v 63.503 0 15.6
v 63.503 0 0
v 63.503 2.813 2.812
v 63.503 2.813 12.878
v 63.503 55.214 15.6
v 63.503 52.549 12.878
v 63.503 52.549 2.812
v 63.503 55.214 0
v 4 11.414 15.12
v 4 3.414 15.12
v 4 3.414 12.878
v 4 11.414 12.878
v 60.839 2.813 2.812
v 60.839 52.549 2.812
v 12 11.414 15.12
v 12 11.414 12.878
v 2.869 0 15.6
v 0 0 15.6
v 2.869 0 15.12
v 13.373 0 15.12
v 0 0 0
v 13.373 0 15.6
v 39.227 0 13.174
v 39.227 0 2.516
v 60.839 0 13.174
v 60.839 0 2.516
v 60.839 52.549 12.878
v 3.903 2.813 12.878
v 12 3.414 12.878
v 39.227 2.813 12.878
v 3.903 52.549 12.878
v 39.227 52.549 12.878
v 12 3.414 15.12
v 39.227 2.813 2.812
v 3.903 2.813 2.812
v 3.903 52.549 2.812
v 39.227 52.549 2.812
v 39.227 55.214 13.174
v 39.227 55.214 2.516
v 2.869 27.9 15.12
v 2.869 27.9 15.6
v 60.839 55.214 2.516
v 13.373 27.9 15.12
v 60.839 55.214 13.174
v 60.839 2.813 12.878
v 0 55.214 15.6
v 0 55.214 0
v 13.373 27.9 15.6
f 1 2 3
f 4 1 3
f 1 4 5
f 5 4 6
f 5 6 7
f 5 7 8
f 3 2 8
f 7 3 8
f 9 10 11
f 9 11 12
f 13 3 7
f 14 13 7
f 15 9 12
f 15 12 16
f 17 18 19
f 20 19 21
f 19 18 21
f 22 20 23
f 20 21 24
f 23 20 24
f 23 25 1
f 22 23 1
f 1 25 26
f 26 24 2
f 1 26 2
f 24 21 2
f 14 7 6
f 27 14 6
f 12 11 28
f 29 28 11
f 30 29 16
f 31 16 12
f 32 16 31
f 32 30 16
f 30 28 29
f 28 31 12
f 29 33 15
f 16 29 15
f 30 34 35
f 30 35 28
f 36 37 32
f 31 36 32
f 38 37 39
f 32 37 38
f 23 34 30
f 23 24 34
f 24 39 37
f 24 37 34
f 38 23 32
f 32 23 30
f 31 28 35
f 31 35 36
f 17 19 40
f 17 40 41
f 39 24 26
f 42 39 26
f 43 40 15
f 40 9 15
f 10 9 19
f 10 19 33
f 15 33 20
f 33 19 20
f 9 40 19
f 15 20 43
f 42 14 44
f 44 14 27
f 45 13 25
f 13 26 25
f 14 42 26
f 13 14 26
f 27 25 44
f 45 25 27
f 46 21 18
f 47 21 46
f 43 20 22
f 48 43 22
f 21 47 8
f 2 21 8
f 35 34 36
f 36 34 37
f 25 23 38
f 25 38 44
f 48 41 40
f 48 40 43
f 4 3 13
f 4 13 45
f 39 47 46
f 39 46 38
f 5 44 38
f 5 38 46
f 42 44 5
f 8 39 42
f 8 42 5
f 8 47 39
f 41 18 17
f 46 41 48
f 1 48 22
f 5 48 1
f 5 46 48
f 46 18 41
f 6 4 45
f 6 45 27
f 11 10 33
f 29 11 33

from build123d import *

# Parameters (mm, degrees)
F0_W     = 63.503295
F0_H     = 55.21382
F1_DEPTH = 15.6
F2_W     = 21.611847
F2_H     = 10.657895
F3_DEPTH = 60.6
F4_W     = 49.736842
F4_H     = 10.06579
F5_DEPTH = 59.6
F6_W     = 8
F6_H     = 8
F7_DEPTH = 6.1
F8_W     = 10.503809
F8_H     = 0.480202
F9_DEPTH = 27.9


with BuildPart() as f1:
    # F0 (on Top) → F1 (new body)
    with BuildSketch(Plane.XY):
        with Locations((31.751647, 27.60691)):
            Rectangle(F0_W, F0_H)
    extrude(amount=F1_DEPTH)

    # F2 (on face) → F3 (cut)
    with BuildSketch(Plane.XZ):
        with Locations((50.032899, 7.845395)):
            Rectangle(F2_W, F2_H)
    extrude(amount=-F3_DEPTH, mode=Mode.SUBTRACT)

    # F4 (on face) → F5 (cut)
    with BuildSketch(Plane.YZ.offset(63.503295)):
        with Locations((27.680923, 7.845395)):
            Rectangle(F4_W, F4_H)
    extrude(amount=-F5_DEPTH, mode=Mode.SUBTRACT)

    # F6 (on face) → F7 (cut)
    with BuildSketch(Plane.XY.offset(15.6)):
        with Locations((8, 7.41359)):
            Rectangle(F6_W, F6_H)
    extrude(amount=-F7_DEPTH, mode=Mode.SUBTRACT)

    # F8 (on face) → F9 (cut)
    with BuildSketch(Plane.XZ):
        with Locations((8.121265, 15.359899)):
            Rectangle(F8_W, F8_H)
    extrude(amount=-F9_DEPTH, mode=Mode.SUBTRACT)


solid = f1.part
